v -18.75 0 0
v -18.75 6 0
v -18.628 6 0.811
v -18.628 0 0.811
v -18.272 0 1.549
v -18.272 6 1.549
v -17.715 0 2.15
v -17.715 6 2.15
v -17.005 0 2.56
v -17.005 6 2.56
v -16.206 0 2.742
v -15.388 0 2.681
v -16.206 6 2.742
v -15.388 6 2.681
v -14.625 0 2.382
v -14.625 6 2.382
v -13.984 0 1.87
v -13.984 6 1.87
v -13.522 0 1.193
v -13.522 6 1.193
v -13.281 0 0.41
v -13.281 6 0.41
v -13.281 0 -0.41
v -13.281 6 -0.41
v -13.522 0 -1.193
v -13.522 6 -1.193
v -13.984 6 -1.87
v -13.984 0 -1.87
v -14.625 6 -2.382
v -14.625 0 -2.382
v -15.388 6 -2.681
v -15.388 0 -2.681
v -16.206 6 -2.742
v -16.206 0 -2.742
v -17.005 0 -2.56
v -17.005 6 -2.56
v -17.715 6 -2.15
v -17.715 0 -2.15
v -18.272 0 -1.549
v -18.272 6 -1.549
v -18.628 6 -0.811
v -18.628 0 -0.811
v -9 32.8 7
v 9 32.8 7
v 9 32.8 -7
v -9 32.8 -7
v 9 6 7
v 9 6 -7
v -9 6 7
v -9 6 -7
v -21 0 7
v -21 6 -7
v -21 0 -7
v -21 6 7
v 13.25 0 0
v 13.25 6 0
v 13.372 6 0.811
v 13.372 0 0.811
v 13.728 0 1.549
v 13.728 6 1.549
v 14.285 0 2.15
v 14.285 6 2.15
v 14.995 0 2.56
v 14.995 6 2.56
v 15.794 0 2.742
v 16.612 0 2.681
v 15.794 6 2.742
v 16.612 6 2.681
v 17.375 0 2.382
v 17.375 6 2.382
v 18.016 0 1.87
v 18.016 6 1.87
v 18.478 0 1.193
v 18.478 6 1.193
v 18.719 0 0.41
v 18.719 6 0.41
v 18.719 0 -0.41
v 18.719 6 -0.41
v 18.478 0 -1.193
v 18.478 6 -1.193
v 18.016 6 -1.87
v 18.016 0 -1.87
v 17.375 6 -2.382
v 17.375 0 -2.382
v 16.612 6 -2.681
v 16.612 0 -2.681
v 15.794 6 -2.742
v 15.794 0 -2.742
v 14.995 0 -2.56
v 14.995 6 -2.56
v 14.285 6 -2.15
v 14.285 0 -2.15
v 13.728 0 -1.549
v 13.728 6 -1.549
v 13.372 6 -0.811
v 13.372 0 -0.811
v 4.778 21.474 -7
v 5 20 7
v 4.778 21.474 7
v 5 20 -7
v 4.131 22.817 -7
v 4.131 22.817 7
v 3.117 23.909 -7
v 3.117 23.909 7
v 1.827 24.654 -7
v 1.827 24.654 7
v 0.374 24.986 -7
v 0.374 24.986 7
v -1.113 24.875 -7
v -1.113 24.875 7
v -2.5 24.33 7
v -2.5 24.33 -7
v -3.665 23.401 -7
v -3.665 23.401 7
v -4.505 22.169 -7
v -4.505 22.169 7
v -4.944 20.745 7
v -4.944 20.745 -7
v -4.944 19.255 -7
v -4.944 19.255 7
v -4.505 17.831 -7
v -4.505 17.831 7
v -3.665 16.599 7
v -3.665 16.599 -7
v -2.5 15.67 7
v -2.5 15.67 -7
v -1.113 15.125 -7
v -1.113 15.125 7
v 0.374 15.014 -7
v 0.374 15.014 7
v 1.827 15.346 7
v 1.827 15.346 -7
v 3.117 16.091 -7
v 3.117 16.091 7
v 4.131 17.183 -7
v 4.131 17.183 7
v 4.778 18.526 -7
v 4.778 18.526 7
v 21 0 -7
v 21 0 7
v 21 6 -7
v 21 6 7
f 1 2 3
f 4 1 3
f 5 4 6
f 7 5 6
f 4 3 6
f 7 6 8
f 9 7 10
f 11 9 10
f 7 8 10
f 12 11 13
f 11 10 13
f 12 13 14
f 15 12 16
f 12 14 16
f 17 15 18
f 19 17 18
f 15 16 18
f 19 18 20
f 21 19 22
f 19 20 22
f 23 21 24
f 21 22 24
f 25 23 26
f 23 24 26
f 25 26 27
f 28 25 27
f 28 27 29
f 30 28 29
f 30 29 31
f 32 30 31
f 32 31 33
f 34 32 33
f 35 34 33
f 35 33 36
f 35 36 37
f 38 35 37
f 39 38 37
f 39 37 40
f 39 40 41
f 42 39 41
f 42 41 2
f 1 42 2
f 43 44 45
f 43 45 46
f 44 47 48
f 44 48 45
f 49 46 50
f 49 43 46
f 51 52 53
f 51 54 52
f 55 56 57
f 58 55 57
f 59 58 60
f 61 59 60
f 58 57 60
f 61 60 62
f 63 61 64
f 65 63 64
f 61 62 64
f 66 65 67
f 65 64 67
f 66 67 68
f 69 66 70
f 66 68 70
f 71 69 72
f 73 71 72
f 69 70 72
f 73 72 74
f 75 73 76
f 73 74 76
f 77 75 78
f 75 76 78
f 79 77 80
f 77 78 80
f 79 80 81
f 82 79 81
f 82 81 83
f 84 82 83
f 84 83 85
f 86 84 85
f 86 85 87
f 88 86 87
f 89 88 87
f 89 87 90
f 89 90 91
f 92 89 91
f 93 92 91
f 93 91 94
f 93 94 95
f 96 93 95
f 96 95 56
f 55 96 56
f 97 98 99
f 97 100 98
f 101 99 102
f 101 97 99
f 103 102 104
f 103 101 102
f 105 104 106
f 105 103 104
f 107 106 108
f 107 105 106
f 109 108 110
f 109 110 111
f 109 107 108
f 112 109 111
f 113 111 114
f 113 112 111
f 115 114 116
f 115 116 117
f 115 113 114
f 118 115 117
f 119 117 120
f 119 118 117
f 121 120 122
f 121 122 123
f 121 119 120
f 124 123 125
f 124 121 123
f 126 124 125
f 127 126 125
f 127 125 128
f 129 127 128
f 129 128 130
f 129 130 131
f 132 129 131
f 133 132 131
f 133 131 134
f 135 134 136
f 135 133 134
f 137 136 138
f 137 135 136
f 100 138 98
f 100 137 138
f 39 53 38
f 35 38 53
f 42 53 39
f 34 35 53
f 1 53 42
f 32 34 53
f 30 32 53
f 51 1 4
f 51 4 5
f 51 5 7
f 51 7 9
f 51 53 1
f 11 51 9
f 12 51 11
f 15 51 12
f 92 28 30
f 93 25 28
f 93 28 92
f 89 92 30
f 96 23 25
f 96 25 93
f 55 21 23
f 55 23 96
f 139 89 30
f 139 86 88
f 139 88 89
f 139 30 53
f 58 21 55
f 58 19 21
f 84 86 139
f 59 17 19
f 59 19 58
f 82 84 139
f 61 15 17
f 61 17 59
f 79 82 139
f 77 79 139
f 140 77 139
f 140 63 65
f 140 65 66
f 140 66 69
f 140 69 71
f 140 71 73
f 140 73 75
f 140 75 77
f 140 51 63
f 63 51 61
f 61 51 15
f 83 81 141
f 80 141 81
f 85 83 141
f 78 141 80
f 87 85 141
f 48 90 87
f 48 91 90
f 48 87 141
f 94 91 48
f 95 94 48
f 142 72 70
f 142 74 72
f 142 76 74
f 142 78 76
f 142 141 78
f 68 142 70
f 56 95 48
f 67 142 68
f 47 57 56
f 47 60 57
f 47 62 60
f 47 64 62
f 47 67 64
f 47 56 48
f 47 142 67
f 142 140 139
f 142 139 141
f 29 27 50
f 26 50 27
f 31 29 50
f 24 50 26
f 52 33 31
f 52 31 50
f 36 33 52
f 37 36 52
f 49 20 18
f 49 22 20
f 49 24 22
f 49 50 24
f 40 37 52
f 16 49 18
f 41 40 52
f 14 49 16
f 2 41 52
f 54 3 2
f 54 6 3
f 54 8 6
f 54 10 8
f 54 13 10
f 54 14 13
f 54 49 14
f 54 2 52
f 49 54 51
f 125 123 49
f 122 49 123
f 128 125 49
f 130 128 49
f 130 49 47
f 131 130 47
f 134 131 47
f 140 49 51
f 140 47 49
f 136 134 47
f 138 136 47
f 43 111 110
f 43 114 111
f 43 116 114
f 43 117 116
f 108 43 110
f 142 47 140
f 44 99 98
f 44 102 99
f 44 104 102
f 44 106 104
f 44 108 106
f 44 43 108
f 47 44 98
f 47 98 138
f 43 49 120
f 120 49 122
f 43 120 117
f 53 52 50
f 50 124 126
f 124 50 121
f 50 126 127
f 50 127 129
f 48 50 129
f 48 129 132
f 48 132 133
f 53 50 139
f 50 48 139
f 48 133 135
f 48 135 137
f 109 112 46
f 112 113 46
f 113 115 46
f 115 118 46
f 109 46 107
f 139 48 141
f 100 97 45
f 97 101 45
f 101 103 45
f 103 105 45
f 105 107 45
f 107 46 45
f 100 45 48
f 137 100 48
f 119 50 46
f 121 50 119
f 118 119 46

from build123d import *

# Parameters (mm, degrees)
SKETCH1_R           = 5
BOSS_EXTRUDE1_DEPTH = 7
SKETCH2_R           = 2.75
CUT_EXTRUDE1_DEPTH  = 35.759746835


with BuildPart() as part:
    # Sketch1 → Boss-Extrude1 (new, symmetric)
    with BuildSketch(Plane.XY):
        Polygon((-21, 0), (21, 0), (21, 6), (9, 6), (9, 32.8), (-9, 32.8), (-9, 6), (-21, 6), align=None)
        with Locations((0, 20)):
            Circle(SKETCH1_R, mode=Mode.SUBTRACT)
    extrude(amount=BOSS_EXTRUDE1_DEPTH, both=True)

    # Sketch2 → Cut-Extrude1 (cut, through all)
    with BuildSketch(Plane(origin=(0, 6, 0), x_dir=(1, 0, 0), z_dir=(0, 1, 0))):
        with Locations(Location((-16, 0, 0), (0, 0, 180))):
            Circle(SKETCH2_R)
        with Locations(Location((16, 0, 0), (0, 0, 180))):
            Circle(SKETCH2_R)
    extrude(amount=-CUT_EXTRUDE1_DEPTH, mode=Mode.SUBTRACT)


solid = part.part
